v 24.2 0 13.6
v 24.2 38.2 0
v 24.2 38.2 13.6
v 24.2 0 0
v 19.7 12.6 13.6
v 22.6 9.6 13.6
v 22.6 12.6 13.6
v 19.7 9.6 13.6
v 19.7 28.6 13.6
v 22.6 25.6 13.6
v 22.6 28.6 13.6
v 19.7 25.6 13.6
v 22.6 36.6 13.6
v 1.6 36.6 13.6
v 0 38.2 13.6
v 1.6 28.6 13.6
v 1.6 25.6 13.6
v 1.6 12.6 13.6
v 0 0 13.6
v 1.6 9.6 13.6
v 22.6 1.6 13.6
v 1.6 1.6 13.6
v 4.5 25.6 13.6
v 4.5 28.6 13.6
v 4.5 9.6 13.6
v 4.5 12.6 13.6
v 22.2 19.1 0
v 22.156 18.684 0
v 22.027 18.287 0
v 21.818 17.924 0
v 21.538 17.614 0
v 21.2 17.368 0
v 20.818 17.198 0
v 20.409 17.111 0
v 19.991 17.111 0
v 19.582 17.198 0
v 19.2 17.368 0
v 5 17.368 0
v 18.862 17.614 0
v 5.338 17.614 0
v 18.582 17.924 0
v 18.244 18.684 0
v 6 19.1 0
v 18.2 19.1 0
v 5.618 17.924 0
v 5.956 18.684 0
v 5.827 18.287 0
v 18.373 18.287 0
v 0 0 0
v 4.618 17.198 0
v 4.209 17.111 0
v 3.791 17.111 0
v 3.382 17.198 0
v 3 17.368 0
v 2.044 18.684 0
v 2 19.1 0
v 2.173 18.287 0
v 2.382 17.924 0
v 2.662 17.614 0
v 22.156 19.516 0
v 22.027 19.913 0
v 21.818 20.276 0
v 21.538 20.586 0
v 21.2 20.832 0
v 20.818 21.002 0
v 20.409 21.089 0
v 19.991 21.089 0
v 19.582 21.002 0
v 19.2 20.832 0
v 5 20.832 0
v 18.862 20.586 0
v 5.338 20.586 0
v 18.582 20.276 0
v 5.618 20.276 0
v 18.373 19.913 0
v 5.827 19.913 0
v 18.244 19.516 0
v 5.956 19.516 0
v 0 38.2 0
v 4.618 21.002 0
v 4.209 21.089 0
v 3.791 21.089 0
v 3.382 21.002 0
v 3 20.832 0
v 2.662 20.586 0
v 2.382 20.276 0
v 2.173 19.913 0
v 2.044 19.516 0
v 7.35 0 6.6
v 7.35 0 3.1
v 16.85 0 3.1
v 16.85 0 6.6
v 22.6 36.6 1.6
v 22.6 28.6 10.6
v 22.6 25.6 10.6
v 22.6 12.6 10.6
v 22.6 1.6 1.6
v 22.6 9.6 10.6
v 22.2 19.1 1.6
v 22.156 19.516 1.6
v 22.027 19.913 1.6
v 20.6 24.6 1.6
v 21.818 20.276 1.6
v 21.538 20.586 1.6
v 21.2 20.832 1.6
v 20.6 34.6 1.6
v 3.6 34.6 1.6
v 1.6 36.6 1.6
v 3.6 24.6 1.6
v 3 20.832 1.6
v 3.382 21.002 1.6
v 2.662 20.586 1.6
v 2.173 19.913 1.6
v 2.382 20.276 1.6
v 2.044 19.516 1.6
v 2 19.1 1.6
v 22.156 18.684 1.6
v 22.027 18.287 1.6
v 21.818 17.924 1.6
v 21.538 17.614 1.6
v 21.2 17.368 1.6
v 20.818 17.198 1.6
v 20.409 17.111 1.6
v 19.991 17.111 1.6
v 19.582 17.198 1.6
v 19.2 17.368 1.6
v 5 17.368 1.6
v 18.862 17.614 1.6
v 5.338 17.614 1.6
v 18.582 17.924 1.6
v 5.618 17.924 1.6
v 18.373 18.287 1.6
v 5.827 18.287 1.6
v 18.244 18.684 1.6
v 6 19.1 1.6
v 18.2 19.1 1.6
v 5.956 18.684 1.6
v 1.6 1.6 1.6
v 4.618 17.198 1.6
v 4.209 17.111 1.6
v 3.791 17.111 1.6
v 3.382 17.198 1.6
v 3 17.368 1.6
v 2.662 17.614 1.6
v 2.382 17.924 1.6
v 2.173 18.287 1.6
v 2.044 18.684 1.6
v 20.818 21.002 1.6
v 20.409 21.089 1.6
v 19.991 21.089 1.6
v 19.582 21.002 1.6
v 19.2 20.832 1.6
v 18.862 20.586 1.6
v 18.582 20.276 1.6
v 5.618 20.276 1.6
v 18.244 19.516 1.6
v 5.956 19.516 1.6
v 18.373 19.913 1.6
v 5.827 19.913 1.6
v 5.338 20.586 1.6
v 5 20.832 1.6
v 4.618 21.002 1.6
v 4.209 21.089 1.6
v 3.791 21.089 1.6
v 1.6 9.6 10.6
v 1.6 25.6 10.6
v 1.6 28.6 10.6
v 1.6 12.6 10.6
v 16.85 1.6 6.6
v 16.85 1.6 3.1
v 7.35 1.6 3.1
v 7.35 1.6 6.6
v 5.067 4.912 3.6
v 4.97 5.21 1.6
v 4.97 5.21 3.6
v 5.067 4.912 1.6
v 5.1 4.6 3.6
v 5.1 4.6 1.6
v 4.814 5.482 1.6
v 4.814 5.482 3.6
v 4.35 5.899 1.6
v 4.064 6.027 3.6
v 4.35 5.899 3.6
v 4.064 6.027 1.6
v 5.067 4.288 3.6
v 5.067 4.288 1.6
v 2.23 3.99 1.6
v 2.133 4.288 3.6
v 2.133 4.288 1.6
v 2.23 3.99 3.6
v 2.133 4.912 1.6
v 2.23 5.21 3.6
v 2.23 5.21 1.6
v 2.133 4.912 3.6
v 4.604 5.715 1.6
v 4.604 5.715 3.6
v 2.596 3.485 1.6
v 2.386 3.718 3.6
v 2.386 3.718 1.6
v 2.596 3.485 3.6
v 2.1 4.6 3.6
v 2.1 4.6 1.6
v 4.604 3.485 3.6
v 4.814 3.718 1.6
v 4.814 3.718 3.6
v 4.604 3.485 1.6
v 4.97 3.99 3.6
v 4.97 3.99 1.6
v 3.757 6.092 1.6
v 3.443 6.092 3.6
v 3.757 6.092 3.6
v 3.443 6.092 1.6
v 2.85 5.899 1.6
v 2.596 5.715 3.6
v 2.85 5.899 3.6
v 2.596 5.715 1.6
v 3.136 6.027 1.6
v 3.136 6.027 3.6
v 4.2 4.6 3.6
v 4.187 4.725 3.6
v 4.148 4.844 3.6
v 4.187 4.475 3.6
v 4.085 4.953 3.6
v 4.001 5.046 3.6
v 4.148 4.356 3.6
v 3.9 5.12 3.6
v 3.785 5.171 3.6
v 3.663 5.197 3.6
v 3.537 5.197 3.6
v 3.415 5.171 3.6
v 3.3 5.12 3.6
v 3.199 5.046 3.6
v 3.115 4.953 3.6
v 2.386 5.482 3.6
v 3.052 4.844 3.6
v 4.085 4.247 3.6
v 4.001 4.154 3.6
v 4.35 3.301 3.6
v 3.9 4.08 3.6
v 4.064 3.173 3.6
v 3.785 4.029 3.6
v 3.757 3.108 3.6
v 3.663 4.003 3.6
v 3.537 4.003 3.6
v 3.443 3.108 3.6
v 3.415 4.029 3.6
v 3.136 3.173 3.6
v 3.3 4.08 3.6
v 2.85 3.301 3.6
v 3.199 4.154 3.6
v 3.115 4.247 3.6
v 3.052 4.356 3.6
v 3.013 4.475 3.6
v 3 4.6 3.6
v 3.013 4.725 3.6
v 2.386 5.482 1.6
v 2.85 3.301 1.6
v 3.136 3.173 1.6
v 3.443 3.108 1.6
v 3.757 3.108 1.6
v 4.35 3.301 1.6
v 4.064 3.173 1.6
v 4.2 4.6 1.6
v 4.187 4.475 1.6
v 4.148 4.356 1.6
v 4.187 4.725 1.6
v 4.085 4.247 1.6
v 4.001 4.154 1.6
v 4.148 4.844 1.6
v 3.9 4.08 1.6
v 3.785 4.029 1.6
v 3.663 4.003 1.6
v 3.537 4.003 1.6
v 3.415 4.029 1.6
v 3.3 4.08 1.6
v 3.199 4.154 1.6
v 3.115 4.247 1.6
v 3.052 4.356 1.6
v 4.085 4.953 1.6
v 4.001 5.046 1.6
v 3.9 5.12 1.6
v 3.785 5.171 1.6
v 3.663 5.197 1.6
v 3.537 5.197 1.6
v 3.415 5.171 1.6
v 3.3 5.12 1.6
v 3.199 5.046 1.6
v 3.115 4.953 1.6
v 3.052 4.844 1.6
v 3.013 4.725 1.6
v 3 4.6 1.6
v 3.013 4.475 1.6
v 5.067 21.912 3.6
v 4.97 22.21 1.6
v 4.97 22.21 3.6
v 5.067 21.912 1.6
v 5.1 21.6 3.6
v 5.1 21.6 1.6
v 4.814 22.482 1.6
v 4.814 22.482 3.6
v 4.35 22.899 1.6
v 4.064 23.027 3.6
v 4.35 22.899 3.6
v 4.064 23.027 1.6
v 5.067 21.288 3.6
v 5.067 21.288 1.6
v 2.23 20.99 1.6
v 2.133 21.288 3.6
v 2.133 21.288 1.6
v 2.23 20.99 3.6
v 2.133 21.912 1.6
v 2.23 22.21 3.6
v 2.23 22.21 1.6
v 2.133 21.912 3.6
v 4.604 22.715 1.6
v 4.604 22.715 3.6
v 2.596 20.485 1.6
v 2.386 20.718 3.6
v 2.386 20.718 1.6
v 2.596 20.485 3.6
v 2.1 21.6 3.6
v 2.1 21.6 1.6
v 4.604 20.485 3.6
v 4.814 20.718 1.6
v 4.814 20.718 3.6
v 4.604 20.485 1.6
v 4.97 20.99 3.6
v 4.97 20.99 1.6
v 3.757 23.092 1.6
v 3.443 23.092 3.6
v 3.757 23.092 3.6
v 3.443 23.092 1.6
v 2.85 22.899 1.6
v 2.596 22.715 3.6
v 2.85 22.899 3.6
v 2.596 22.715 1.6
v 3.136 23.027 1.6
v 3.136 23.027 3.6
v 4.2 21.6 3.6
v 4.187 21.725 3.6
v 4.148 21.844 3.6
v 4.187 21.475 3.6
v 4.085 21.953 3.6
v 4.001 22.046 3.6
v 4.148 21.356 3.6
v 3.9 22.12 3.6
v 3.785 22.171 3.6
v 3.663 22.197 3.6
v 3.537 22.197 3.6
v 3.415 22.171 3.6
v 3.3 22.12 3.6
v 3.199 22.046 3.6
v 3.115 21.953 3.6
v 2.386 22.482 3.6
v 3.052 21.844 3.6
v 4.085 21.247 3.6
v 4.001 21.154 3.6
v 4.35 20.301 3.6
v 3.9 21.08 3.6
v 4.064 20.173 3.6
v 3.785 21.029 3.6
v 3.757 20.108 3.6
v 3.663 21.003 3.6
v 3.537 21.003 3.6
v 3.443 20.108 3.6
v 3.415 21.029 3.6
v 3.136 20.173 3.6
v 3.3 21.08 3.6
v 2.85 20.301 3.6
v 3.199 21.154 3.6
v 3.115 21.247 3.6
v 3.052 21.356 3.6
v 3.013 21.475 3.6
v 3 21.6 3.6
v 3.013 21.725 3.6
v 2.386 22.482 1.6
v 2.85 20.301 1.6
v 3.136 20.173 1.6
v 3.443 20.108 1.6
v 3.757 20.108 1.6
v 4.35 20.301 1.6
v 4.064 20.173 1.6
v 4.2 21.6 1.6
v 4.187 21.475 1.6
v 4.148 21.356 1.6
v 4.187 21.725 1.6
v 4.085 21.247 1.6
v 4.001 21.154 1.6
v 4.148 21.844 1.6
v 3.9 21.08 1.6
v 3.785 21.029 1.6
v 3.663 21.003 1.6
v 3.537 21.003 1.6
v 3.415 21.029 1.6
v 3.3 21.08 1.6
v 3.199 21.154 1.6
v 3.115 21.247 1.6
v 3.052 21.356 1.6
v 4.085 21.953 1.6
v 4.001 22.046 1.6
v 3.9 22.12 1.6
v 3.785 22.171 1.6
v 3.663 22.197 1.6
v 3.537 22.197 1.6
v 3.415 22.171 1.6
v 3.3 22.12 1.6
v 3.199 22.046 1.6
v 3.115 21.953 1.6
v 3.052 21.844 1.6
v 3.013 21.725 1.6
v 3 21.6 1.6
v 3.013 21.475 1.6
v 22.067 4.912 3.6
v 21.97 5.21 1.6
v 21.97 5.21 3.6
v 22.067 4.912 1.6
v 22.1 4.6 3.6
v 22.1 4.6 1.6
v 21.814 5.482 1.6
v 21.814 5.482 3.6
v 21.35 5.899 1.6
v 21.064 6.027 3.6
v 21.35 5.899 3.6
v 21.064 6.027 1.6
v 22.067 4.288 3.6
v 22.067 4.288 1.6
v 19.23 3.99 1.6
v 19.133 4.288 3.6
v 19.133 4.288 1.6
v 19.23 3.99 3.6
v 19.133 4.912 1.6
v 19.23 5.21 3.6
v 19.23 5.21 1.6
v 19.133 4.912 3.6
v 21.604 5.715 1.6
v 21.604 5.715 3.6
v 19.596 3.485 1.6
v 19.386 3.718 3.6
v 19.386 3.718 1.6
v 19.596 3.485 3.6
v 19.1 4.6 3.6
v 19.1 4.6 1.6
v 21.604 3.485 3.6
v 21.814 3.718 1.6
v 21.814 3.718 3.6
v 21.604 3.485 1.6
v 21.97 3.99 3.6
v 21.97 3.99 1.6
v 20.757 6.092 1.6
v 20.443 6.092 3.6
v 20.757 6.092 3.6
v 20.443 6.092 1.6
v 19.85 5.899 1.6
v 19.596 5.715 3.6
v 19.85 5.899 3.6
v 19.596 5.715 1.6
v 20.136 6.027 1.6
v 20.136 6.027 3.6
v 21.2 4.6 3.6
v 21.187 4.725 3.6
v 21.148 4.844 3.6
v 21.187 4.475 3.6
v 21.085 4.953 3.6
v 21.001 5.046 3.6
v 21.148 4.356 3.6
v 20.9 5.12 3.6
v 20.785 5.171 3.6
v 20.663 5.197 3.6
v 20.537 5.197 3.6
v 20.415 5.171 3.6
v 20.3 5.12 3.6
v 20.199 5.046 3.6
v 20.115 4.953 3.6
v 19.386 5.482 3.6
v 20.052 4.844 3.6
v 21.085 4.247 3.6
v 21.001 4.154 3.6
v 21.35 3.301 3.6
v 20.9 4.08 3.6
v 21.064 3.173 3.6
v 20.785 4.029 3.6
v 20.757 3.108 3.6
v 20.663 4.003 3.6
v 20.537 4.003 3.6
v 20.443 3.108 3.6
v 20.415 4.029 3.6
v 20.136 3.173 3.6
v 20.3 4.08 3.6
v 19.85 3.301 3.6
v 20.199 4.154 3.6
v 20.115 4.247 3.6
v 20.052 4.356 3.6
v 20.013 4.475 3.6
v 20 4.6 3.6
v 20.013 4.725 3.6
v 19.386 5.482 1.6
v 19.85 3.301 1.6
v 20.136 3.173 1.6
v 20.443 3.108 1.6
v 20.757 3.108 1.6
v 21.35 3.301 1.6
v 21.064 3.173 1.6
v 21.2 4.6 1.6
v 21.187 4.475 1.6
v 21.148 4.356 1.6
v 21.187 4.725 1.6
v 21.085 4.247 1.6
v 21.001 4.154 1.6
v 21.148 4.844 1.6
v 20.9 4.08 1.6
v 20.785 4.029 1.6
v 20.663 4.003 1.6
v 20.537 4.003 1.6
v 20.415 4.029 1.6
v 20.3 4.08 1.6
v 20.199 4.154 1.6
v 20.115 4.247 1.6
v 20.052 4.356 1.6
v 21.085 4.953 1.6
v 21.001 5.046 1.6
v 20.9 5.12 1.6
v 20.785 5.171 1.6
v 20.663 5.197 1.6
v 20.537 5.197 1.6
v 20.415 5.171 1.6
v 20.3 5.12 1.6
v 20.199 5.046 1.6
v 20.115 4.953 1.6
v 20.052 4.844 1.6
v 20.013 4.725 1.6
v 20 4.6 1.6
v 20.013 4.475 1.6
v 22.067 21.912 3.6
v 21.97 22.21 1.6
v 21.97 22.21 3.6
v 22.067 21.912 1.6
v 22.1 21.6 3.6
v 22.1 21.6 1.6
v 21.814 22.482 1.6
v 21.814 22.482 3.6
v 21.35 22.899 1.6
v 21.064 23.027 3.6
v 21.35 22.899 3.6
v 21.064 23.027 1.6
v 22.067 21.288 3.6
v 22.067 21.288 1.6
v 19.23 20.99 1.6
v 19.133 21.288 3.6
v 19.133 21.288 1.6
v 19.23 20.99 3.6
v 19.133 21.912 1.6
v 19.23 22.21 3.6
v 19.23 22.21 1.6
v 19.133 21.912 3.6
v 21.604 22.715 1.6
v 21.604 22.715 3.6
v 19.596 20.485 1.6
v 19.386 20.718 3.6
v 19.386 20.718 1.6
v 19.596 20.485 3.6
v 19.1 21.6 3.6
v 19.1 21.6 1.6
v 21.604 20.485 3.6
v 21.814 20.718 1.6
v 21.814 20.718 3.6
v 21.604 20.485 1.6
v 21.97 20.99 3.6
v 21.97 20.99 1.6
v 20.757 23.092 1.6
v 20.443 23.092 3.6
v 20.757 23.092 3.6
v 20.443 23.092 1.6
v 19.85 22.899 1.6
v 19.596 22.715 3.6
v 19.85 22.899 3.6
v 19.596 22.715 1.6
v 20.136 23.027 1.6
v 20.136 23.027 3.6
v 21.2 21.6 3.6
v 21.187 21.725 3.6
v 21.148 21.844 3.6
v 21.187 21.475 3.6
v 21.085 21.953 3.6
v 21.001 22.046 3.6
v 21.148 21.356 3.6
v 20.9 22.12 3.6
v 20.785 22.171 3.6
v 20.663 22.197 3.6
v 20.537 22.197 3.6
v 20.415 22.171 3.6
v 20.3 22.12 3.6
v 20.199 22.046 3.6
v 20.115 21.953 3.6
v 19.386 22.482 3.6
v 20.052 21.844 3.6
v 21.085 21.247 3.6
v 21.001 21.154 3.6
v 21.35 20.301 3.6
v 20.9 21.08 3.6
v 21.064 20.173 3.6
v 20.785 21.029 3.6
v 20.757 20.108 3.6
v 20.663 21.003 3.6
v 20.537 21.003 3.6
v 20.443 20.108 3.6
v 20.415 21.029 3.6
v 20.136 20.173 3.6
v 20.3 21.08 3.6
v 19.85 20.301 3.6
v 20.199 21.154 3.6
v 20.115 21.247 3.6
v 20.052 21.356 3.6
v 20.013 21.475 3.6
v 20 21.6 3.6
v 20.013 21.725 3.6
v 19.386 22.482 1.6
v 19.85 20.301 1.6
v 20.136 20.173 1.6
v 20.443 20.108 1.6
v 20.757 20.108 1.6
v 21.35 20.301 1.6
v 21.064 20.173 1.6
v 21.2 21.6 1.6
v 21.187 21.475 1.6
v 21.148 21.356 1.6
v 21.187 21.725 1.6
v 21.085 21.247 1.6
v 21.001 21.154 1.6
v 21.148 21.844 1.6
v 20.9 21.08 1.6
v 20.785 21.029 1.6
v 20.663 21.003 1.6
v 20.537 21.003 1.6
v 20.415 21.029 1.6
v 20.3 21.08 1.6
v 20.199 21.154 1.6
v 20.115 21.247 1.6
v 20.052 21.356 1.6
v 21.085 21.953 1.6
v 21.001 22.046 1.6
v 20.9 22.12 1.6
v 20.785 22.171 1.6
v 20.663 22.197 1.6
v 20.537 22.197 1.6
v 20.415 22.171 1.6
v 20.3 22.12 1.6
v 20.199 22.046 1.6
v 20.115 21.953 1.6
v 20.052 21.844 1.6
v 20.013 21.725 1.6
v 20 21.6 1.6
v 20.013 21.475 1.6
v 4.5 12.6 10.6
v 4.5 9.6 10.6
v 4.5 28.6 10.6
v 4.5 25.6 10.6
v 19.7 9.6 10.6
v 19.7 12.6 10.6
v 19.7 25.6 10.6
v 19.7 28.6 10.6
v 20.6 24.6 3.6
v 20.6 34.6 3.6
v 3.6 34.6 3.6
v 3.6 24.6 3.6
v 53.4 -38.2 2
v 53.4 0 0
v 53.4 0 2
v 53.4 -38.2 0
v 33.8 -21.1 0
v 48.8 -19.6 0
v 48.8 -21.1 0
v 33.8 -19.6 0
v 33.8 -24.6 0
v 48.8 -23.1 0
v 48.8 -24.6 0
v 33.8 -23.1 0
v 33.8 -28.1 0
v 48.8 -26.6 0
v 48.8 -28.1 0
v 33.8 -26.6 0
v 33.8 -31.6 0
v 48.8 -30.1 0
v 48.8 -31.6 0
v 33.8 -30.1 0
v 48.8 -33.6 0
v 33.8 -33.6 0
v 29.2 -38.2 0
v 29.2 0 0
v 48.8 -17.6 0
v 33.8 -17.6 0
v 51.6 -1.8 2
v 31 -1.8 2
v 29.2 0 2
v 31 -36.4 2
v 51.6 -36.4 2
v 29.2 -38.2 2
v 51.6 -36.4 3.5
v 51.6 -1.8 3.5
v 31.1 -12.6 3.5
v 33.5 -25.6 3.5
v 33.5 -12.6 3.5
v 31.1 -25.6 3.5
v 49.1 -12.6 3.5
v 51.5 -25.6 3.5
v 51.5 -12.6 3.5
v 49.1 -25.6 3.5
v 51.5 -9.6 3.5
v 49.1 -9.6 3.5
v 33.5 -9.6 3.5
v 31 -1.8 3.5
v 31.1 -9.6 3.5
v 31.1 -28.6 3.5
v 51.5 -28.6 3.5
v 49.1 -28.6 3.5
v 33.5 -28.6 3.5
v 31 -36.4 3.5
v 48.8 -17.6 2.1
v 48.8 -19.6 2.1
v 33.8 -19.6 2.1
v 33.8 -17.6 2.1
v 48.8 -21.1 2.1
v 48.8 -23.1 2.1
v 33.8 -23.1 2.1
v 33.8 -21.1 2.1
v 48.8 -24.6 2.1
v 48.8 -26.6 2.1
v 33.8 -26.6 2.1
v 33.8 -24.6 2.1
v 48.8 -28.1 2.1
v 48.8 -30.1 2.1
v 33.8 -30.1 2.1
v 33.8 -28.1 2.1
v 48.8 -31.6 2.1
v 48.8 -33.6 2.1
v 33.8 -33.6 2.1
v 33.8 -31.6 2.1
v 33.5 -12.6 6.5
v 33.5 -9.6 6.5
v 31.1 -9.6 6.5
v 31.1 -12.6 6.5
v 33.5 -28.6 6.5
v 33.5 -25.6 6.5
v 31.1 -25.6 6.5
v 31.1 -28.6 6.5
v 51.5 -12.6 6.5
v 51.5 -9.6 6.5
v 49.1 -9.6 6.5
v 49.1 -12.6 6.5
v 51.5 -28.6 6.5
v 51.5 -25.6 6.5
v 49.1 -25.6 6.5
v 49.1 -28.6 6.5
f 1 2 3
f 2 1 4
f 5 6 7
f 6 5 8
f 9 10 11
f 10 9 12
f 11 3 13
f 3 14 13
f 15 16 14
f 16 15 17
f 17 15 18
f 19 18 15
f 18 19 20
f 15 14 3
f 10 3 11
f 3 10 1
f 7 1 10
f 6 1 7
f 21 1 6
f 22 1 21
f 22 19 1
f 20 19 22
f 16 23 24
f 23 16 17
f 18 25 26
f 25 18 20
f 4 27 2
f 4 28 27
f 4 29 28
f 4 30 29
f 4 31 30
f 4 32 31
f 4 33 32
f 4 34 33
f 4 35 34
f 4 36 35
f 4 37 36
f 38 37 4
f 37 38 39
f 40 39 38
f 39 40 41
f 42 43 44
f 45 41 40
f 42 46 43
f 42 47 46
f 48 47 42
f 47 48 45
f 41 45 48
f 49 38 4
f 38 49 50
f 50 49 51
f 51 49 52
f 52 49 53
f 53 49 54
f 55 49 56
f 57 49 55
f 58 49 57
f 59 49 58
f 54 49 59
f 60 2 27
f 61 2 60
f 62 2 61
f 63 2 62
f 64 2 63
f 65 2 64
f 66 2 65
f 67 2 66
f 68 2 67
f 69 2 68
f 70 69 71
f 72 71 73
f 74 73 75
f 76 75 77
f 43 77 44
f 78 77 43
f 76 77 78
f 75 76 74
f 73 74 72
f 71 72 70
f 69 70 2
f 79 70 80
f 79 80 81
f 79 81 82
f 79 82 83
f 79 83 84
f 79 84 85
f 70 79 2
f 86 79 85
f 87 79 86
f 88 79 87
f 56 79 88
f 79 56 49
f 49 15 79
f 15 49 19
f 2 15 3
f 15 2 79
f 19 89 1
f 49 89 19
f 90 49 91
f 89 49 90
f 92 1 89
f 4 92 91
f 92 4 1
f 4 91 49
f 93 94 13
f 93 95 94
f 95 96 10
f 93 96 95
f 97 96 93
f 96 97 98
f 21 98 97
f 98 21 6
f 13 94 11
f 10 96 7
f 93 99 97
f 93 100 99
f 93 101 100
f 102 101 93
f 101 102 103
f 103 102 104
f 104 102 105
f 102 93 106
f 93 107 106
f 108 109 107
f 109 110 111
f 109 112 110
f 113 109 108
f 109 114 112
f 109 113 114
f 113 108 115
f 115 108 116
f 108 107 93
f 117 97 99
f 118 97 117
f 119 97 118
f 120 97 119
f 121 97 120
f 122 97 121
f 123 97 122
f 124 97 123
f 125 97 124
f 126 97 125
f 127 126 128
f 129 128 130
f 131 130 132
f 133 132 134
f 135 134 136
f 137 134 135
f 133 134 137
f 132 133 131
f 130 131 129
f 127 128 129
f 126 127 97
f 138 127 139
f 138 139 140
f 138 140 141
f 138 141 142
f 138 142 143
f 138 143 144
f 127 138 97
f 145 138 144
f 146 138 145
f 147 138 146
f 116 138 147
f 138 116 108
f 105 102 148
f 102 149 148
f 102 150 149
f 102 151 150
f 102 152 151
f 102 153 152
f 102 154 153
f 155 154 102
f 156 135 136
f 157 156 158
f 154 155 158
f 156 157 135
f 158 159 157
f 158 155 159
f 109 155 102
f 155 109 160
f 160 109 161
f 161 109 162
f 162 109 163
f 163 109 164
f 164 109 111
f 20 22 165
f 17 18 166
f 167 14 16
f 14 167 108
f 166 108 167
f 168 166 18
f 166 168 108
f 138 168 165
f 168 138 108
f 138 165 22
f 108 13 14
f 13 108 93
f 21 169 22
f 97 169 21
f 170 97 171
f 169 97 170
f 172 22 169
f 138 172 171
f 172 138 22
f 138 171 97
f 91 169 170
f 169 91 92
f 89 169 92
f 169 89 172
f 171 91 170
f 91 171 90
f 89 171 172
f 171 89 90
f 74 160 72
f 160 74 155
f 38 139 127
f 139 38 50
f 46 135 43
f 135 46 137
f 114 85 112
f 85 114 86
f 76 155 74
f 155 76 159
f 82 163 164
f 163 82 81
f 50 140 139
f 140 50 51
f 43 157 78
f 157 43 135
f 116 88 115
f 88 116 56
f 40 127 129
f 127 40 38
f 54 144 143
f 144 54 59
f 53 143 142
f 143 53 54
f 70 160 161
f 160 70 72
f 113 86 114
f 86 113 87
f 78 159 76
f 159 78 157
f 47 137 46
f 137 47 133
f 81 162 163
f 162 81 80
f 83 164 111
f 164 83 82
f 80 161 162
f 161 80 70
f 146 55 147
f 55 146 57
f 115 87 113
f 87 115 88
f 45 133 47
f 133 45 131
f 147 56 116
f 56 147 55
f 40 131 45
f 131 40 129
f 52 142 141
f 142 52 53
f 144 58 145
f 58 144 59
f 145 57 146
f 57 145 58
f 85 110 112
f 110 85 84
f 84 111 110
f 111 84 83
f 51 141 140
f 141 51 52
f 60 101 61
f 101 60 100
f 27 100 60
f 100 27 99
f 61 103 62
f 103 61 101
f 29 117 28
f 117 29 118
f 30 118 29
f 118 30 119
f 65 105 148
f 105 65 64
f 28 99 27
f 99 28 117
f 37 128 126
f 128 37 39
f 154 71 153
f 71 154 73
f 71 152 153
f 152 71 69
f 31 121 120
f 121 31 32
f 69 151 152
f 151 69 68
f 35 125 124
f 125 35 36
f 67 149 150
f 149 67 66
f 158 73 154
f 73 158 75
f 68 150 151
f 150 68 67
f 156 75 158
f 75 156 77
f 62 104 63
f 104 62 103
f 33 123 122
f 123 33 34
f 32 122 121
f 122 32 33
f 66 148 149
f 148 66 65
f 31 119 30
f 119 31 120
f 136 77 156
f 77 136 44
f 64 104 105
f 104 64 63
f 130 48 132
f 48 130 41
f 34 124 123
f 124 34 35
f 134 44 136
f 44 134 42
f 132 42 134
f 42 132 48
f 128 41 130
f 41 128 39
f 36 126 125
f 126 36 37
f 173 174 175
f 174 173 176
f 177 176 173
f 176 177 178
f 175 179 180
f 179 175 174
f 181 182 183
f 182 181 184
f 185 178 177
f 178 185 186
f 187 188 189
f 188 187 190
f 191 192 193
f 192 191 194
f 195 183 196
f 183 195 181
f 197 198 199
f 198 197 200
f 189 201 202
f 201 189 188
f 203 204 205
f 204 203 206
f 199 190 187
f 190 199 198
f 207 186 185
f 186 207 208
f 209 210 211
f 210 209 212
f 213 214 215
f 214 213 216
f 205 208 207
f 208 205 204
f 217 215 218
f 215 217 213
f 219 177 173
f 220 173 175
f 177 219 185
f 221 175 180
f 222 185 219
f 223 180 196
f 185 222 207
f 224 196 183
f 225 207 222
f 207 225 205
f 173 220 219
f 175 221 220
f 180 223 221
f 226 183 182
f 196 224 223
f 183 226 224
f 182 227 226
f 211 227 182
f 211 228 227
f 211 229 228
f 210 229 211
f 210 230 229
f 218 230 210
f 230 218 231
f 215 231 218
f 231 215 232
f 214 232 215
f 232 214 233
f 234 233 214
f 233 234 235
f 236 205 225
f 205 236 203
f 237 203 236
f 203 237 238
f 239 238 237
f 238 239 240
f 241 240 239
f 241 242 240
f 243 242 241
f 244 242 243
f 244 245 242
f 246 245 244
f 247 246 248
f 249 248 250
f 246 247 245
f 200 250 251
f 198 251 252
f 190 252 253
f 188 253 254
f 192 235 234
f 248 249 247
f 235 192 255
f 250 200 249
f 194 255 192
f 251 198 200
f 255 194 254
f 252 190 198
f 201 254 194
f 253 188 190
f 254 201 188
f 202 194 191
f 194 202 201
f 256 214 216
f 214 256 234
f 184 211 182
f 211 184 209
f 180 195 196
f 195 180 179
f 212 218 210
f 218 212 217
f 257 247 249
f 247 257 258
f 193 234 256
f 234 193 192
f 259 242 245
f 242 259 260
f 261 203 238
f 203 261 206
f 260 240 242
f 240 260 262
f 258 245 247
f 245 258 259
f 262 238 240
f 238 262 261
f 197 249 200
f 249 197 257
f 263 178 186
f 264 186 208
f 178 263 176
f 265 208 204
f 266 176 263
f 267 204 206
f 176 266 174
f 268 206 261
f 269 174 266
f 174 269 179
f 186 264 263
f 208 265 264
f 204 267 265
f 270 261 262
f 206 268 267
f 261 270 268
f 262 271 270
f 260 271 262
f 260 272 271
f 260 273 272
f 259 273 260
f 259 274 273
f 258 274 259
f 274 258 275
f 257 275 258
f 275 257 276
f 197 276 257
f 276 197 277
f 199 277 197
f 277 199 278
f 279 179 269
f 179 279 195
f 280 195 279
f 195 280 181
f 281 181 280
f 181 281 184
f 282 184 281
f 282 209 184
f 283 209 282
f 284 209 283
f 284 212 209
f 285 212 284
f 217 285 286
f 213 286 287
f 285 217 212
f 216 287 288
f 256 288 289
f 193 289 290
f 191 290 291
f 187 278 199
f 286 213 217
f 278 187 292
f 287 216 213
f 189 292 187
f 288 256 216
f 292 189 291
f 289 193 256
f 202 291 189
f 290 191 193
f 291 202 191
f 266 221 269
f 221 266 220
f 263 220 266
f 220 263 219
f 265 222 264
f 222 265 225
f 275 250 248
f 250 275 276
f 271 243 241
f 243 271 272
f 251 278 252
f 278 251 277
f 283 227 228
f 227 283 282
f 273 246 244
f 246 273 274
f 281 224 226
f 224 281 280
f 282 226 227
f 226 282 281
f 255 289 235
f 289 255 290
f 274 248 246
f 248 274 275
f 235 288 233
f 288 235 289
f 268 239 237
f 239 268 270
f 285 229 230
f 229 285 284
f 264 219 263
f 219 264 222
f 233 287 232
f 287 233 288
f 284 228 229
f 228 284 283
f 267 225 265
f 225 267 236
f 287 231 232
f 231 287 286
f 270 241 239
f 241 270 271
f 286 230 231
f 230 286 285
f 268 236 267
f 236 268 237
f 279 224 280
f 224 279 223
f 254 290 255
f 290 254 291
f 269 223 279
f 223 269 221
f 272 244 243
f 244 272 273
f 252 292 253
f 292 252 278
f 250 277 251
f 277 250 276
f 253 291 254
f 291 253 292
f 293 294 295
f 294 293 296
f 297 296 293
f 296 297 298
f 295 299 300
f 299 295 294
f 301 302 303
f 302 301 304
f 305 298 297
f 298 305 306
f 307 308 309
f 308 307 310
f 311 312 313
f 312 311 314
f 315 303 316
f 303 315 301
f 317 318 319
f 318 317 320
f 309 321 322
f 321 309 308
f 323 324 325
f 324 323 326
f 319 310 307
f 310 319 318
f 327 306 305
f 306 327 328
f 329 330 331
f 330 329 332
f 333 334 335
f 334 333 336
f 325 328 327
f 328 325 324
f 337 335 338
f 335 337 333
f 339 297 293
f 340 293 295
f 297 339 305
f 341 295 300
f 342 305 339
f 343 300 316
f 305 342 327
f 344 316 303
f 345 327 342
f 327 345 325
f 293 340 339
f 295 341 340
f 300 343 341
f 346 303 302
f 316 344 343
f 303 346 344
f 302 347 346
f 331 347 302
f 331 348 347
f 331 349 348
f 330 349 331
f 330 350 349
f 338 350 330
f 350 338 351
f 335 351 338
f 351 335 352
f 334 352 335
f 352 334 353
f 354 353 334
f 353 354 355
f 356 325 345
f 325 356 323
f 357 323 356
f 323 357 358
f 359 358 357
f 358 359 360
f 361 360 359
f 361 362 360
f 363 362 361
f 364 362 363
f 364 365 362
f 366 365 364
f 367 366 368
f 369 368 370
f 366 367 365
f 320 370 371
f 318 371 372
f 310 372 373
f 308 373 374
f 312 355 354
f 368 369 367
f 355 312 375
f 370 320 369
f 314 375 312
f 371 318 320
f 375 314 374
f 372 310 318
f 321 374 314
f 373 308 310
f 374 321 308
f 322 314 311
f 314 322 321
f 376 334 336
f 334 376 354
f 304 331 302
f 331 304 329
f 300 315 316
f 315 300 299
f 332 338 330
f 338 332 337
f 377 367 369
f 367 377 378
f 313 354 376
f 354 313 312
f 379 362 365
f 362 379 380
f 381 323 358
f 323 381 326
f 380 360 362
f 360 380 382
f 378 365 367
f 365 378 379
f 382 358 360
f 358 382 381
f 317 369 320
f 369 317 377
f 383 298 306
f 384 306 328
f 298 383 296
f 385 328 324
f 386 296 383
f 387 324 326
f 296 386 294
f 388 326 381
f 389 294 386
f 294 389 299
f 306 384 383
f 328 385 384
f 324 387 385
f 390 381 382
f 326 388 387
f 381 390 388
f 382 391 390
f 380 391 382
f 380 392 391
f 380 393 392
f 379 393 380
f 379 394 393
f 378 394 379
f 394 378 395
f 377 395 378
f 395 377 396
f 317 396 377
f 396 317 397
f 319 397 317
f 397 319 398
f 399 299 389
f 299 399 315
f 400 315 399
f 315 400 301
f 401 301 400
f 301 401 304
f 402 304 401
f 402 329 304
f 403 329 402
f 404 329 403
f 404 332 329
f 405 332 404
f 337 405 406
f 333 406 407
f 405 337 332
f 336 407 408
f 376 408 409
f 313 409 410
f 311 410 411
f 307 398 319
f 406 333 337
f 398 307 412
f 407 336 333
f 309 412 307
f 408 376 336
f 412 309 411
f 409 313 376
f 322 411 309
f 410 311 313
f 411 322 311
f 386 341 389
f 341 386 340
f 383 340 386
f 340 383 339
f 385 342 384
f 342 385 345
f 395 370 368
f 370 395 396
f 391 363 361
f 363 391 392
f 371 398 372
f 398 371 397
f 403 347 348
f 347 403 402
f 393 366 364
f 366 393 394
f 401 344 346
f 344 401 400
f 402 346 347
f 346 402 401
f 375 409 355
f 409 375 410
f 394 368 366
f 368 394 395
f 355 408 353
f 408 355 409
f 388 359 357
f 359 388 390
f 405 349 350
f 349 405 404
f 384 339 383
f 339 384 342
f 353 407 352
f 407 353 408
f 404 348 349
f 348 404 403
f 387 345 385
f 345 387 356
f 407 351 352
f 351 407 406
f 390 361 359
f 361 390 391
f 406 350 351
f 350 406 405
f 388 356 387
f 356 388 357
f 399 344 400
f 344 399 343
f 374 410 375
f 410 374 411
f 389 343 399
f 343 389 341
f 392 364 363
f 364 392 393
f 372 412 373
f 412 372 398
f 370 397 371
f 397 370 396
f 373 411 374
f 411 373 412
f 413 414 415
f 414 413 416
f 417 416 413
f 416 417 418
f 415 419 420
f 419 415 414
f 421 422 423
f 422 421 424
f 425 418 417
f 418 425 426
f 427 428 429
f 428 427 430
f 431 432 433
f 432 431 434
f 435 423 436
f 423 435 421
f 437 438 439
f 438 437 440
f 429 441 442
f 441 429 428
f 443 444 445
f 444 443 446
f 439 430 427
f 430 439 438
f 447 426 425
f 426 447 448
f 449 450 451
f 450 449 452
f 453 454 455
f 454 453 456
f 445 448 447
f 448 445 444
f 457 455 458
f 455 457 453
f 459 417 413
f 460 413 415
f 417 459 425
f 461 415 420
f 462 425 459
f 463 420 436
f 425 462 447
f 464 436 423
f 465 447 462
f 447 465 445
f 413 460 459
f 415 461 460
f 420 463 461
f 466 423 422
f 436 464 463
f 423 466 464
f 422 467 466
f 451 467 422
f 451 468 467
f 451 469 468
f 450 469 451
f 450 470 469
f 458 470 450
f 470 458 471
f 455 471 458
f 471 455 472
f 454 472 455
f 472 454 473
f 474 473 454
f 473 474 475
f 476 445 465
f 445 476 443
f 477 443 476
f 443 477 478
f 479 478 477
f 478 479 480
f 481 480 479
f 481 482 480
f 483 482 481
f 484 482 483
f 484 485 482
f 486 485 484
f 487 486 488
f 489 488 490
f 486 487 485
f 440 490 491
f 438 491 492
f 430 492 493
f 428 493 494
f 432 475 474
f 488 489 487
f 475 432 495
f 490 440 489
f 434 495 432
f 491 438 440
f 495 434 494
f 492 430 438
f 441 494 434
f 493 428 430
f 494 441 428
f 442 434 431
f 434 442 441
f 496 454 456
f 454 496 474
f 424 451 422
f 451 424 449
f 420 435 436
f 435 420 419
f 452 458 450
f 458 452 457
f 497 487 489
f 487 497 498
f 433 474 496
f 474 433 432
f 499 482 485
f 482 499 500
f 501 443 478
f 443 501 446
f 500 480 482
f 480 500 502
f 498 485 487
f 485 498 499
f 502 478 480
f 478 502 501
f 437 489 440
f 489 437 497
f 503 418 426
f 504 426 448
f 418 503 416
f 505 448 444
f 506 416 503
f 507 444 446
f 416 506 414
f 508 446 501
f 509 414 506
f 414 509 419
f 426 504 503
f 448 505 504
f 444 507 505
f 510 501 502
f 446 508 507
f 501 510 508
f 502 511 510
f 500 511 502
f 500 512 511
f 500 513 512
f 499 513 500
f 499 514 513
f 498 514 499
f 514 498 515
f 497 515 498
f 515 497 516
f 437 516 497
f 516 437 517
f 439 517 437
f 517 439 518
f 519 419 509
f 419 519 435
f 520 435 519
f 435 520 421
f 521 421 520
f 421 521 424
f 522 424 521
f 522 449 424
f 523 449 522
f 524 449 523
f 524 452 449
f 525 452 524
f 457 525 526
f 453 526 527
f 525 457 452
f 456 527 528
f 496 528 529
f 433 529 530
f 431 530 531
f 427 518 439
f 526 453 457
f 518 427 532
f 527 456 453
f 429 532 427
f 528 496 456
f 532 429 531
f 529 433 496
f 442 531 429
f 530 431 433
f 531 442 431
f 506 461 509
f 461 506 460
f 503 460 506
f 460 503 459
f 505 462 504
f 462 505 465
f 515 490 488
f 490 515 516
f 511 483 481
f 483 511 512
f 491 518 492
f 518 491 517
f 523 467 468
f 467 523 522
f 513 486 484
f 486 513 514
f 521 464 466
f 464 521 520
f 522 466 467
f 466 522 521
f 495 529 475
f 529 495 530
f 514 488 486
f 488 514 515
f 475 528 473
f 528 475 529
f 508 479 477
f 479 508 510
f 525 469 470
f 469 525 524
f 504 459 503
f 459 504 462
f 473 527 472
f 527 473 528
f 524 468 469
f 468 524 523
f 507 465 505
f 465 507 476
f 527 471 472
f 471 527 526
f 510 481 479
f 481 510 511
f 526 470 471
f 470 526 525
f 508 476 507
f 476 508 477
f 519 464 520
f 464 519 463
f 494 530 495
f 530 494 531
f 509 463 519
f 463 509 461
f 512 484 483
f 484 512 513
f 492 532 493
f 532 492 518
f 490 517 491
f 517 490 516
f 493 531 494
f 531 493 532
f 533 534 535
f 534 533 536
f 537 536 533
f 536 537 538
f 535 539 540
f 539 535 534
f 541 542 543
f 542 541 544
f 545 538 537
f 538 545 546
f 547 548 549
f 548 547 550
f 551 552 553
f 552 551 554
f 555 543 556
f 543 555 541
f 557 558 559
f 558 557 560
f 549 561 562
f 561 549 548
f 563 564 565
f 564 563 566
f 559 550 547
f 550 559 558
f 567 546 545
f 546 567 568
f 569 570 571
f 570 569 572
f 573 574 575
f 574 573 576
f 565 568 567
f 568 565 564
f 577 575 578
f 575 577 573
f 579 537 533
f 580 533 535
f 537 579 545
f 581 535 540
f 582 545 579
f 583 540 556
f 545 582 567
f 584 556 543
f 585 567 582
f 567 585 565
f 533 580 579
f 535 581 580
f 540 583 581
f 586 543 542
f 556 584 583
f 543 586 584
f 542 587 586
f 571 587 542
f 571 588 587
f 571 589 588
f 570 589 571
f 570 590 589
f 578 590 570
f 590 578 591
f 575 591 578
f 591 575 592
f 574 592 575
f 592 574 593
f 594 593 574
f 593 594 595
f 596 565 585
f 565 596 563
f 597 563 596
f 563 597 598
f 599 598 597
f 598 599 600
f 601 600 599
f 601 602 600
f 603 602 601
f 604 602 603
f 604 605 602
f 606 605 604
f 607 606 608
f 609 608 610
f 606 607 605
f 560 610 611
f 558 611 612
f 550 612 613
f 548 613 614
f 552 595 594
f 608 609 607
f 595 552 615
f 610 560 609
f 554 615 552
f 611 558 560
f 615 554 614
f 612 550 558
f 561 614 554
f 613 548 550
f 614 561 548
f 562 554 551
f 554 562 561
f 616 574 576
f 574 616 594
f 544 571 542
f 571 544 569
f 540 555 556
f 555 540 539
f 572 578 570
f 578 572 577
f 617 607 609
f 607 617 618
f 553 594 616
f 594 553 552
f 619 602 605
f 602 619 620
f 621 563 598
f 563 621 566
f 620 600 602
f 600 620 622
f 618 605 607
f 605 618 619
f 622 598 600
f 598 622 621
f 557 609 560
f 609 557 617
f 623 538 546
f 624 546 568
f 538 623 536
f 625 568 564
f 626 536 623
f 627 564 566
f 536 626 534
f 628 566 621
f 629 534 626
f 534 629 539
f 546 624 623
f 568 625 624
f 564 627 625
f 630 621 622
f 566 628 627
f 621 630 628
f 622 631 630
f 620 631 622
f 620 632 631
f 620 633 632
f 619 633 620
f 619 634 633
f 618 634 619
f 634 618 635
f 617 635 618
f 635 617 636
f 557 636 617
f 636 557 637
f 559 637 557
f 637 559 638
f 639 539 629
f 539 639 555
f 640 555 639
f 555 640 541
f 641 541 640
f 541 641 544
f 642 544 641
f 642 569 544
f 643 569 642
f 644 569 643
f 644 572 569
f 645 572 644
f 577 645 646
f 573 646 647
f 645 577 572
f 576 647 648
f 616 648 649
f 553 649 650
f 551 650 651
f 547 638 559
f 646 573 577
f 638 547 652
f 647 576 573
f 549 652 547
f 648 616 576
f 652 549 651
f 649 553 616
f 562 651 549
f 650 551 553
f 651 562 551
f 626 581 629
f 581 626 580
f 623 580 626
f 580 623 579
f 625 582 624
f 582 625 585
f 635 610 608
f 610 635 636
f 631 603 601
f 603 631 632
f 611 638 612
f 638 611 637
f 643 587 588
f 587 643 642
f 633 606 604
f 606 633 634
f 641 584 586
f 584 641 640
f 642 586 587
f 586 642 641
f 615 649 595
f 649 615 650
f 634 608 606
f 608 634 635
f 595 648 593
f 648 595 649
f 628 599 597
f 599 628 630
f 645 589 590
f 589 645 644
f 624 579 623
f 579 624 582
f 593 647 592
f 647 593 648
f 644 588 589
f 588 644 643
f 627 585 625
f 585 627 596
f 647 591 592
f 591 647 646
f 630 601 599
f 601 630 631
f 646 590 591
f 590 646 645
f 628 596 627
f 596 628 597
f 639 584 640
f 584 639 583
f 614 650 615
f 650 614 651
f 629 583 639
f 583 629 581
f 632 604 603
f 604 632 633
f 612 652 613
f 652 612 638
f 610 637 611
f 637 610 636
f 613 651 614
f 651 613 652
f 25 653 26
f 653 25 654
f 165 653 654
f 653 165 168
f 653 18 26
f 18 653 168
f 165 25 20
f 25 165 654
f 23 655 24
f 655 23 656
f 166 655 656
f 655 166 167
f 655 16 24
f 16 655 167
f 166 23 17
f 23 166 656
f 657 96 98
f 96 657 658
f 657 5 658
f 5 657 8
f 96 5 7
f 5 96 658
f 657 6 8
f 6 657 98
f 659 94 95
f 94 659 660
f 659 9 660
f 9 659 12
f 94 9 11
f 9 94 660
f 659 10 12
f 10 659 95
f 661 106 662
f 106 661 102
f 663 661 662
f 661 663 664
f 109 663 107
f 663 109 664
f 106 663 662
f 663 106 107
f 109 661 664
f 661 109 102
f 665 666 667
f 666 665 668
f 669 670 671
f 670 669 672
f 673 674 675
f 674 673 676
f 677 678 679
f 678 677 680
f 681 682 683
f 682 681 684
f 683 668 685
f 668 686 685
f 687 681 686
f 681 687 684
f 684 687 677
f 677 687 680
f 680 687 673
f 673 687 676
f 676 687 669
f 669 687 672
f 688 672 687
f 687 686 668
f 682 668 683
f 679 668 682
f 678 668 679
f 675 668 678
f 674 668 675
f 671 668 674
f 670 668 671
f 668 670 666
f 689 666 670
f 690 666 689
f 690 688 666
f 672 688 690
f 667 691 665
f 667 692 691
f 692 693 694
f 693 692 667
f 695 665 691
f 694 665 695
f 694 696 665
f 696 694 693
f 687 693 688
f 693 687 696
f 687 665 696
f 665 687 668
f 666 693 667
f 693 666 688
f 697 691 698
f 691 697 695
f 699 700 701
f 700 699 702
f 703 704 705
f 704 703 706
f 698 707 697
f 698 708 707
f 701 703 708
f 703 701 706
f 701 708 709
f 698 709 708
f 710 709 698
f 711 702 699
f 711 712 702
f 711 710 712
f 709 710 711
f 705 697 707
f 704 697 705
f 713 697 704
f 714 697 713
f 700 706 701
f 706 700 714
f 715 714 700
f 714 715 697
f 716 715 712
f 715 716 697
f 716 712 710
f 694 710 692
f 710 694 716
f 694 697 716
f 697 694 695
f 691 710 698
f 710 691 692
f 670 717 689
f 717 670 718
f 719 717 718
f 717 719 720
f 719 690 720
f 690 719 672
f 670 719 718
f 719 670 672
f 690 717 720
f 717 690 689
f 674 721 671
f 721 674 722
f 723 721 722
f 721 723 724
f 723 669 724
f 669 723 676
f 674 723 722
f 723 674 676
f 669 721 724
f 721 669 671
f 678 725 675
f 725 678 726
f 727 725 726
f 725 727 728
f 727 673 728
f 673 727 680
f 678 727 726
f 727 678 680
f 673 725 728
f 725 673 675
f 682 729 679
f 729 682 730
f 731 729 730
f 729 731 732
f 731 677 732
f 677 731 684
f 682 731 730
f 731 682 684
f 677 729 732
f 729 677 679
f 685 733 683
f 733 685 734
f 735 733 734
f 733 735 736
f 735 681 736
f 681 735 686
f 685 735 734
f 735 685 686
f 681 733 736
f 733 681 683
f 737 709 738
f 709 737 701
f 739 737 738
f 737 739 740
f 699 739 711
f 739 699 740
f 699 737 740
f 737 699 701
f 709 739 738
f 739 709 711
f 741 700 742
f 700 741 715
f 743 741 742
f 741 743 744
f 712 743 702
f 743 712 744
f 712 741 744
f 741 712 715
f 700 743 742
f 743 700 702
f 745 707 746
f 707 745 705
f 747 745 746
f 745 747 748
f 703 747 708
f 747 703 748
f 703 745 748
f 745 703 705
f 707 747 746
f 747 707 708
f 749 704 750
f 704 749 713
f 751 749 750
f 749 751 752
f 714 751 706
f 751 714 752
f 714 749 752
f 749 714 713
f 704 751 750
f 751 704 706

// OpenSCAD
// Homelab Sensor Case — Parametric OpenSCAD
// For: XIAO ESP32-C6 + GY-SHT31-D breakout
// Print: PLA/PETG, 0.2mm layers, 20% infill, no supports

/* [Dimensions] */
wall = 1.6;           // Wall thickness
inner_w = 21;         // Inner width (XIAO is ~17.5mm)
inner_l = 35;         // Inner length
inner_h = 12;         // Inner height

/* [USB Cutout] */
usb_w = 9.5;          // USB-C width
usb_h = 3.5;          // USB-C height
usb_z = 1.5;          // USB-C offset from floor

/* [Vent Grid] */
vent_slots = 5;       // Number of vent slots
vent_w = 2;           // Slot width
vent_gap = 1.5;       // Gap between slots
vent_offset_x = 3;    // Offset from SHT31 end

/* [Mount Holes] */
mount_d = 4;          // Mount hole diameter
mount_inset = 4;      // Inset from edges

/* [Snap Clips] */
clip_w = 3;           // Clip width
clip_d = 0.8;         // Clip depth (snap distance)
clip_h = 3;           // Clip height

/* [PCB Standoffs] */
standoff_h = 2;       // Height above floor
standoff_d = 3;       // Standoff diameter
standoff_hole = 1.2;  // Screw hole (M1.2)

// Derived
outer_w = inner_w + 2*wall;
outer_l = inner_l + 2*wall;
outer_h = inner_h + wall;  // Floor only, lid is separate
lid_h = 2;
$fn = 30;

// --- BODY ---
module body() {
    difference() {
        // Outer shell
        cube([outer_w, outer_l, outer_h]);
        // Inner cavity
        translate([wall, wall, wall])
            cube([inner_w, inner_l, inner_h + 1]);  // +1 to open top
        // USB-C cutout (short end, Y=0)
        translate([(outer_w - usb_w)/2, -0.1, wall + usb_z])
            cube([usb_w, wall + 0.2, usb_h]);
        // Mount holes (back wall, through)
        translate([mount_inset, outer_l/2, -0.1])
            cylinder(d=mount_d, h=wall + 0.2);
        translate([outer_w - mount_inset, outer_l/2, -0.1])
            cylinder(d=mount_d, h=wall + 0.2);
    }
    // PCB standoffs (XIAO positions, approximate)
    for (x = [wall + 2, wall + inner_w - 2])
        for (y = [wall + 3, wall + 20])
            translate([x, y, wall])
                difference() {
                    cylinder(d=standoff_d, h=standoff_h);
                    cylinder(d=standoff_hole, h=standoff_h + 0.1);
                }
    // SHT31 shelf (elevated platform at far end)
    translate([wall + 2, wall + inner_l - 12, wall])
        cube([inner_w - 4, 10, standoff_h]);
    // Snap clip receivers (inside walls)
    for (x = [wall - 0.1, outer_w - wall - clip_w + 0.1])
        for (y = [wall + 8, wall + inner_l - 8 - clip_w])
            translate([x, y, outer_h - clip_h])
                cube([clip_w, clip_w, clip_h]);
}

// --- LID ---
module lid() {
    difference() {
        union() {
            // Lid plate
            cube([outer_w, outer_l, lid_h]);
            // Inner lip (fits inside body)
            translate([wall + 0.2, wall + 0.2, -1.5])
                cube([inner_w - 0.4, inner_l - 0.4, 1.5]);
        }
        // Vent grid (over SHT31 area)
        vent_total = vent_slots * vent_w + (vent_slots - 1) * vent_gap;
        vent_start_y = outer_l - vent_offset_x - wall - vent_total;
        for (i = [0:vent_slots-1])
            translate([wall + 3, vent_start_y + i * (vent_w + vent_gap), -0.1])
                cube([inner_w - 6, vent_w, lid_h + 0.2]);
    }
    // Snap clips (on lid underside)
    for (x = [wall + 0.3, outer_w - wall - clip_w + 0.3])
        for (y = [wall + 8, wall + inner_l - 8 - clip_w])
            translate([x, y, -1.5 - clip_h]) {
                cube([clip_w - 0.6, clip_w, clip_h]);
                // Snap bump
                translate([0, 0, 0])
                    cube([clip_w - 0.6, clip_w, clip_d]);
            }
}

// --- RENDER ---
// Body
body();
// Lid (offset for printing side by side)
translate([outer_w + 5, 0, lid_h])
    rotate([180, 0, 0])
        lid();
